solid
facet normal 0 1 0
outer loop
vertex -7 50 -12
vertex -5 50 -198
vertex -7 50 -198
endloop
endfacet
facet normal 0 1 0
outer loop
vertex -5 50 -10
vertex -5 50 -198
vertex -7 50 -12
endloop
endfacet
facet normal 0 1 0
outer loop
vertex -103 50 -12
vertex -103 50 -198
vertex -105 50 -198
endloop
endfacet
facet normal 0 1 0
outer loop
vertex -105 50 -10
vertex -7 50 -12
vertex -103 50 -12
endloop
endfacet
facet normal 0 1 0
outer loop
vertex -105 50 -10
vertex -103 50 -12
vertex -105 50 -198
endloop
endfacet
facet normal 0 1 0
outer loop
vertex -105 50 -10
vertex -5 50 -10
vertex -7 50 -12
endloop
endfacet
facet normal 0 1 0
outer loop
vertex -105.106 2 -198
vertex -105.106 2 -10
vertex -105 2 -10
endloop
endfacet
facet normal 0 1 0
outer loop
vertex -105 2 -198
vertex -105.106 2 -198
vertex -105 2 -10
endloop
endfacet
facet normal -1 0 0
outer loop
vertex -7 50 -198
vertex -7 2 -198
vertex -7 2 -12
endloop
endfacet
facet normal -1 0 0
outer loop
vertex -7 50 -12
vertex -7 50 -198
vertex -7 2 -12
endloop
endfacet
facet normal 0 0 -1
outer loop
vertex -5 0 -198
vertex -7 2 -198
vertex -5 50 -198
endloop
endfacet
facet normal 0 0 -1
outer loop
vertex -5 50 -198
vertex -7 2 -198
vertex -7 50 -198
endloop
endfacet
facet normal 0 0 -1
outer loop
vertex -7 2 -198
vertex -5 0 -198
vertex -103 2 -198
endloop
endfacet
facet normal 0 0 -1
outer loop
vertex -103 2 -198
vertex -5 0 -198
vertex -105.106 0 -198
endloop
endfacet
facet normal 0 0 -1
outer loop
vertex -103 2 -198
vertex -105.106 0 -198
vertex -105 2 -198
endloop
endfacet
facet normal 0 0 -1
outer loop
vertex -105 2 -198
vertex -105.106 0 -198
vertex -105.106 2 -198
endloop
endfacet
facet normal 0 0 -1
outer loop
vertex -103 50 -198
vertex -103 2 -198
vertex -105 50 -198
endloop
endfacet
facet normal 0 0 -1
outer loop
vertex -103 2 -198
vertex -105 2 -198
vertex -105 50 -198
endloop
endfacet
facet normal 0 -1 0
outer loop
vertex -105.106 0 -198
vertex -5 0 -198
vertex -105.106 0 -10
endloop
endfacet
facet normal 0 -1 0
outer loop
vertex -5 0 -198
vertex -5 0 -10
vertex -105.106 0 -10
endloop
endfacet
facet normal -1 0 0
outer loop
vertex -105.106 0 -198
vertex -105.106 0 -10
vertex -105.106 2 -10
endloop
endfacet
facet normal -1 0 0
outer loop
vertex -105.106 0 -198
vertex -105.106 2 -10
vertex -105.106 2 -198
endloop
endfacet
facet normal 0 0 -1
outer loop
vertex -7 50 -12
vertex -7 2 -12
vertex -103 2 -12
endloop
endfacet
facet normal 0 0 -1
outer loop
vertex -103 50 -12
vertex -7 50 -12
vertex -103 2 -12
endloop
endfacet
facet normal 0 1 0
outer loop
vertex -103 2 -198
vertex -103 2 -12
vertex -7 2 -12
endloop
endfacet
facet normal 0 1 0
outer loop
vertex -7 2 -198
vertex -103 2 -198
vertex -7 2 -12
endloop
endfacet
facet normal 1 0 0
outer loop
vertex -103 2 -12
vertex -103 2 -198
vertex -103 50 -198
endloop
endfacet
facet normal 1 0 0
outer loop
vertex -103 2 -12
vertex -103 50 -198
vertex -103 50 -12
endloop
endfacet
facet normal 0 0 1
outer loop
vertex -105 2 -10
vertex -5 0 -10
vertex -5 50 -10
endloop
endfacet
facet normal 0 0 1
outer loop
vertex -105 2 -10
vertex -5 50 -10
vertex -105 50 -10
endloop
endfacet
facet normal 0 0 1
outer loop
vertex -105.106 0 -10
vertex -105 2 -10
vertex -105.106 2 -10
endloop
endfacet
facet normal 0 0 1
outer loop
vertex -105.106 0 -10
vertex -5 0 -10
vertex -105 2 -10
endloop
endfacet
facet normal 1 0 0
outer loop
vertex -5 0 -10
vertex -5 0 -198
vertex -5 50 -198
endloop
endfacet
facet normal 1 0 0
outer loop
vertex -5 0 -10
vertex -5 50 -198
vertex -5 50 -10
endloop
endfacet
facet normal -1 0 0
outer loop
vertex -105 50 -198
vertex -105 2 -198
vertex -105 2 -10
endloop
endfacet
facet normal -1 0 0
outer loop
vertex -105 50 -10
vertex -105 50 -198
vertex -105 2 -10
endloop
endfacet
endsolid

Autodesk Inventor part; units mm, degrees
ref_plane "YZ Plane" through (0, 0, 0) normal (1, 0, 0) x (0, 1, 0)
ref_plane "XZ Plane" through (0, 0, 0) normal (0, 1, 0) x (-1, 0, 0)
ref_plane "XY Plane" through (0, 0, 0) normal (0, 0, 1) x (1, 0, 0)
sketch "Sketch1" plane through (0, 0, 0) normal (0, 1, 0) x (-1, 0, 0)
  line L0 (0, 0) -> (110, 0)
  line L1 (110, 0) -> (110, -200)
  line L2 (110, -200) -> (0, -200)
  line L3 (0, -200) -> (0, 0)
  line L4 (110, -200) -> (105, -200)
  line L5 (0, -200) -> (5, -200)
  line L6 (5, -200) -> (5, -10)
  line L7 (5, -10) -> (107.5, -10)
  line L8 (105, -200) -> (105, -10)
  line L9 (5, -200) -> (7, -200)
  line L10 (7, -200) -> (7, -12)
  line L11 (7, -12) -> (103, -12)
  line L12 (7, -200) -> (7, -198)
  line L13 (7, -198) -> (103, -198)
  line L14 (103, -198) -> (103, -12)
  line L15 (103, -198) -> (105, -198)
  dimension "d0" = 110
  dimension "d1" = 200
  dimension "d2" = 5
  dimension "d3" = 5
  dimension "d4" = 190
  dimension "d5" = 2
  dimension "d6" = 188
  dimension "d7" = 96
  dimension "d8" = 2
extrude "Extrusion1" add sketch "Sketch1" along normal blind 50 contours L6 L7 L8 L15 L14 L11 L10 L2
sketch "Sketch2" plane through (0, 0, 0) normal (0, -1, 0) x (1, 0, 0)
  line L0 (-5, -10) -> (-5, -200) projected
  line L1 (-5, -10) -> (-105.1065, -10)
  line L2 (-105.1065, -10) -> (-105.1065, -198)
  line L3 (-105.1065, -198) -> (-5, -198)
  line L4 (-5, -198) -> (-5, -10)
  point P0 (0, 0)
extrude "Extrusion2" add sketch "Sketch2" against normal blind 2
sketch "Sketch3" plane through (-7, 0, -200) normal (-1, 0, 0) x (0, 0, 1)
  line L0 (190, 50) -> (0, 50) projected
  line L1 (0, 0) -> (2, 0)
  line L2 (2, 0) -> (2, 50)
  line L3 (2, 50) -> (0, 50)
  line L4 (0, 50) -> (0, 0)
  point P0 (200, 0)
  dimension "d13" = 2
extrude "Extrusion3" cut sketch "Sketch3" against normal blind 23.25
properties part number "aaaa"
